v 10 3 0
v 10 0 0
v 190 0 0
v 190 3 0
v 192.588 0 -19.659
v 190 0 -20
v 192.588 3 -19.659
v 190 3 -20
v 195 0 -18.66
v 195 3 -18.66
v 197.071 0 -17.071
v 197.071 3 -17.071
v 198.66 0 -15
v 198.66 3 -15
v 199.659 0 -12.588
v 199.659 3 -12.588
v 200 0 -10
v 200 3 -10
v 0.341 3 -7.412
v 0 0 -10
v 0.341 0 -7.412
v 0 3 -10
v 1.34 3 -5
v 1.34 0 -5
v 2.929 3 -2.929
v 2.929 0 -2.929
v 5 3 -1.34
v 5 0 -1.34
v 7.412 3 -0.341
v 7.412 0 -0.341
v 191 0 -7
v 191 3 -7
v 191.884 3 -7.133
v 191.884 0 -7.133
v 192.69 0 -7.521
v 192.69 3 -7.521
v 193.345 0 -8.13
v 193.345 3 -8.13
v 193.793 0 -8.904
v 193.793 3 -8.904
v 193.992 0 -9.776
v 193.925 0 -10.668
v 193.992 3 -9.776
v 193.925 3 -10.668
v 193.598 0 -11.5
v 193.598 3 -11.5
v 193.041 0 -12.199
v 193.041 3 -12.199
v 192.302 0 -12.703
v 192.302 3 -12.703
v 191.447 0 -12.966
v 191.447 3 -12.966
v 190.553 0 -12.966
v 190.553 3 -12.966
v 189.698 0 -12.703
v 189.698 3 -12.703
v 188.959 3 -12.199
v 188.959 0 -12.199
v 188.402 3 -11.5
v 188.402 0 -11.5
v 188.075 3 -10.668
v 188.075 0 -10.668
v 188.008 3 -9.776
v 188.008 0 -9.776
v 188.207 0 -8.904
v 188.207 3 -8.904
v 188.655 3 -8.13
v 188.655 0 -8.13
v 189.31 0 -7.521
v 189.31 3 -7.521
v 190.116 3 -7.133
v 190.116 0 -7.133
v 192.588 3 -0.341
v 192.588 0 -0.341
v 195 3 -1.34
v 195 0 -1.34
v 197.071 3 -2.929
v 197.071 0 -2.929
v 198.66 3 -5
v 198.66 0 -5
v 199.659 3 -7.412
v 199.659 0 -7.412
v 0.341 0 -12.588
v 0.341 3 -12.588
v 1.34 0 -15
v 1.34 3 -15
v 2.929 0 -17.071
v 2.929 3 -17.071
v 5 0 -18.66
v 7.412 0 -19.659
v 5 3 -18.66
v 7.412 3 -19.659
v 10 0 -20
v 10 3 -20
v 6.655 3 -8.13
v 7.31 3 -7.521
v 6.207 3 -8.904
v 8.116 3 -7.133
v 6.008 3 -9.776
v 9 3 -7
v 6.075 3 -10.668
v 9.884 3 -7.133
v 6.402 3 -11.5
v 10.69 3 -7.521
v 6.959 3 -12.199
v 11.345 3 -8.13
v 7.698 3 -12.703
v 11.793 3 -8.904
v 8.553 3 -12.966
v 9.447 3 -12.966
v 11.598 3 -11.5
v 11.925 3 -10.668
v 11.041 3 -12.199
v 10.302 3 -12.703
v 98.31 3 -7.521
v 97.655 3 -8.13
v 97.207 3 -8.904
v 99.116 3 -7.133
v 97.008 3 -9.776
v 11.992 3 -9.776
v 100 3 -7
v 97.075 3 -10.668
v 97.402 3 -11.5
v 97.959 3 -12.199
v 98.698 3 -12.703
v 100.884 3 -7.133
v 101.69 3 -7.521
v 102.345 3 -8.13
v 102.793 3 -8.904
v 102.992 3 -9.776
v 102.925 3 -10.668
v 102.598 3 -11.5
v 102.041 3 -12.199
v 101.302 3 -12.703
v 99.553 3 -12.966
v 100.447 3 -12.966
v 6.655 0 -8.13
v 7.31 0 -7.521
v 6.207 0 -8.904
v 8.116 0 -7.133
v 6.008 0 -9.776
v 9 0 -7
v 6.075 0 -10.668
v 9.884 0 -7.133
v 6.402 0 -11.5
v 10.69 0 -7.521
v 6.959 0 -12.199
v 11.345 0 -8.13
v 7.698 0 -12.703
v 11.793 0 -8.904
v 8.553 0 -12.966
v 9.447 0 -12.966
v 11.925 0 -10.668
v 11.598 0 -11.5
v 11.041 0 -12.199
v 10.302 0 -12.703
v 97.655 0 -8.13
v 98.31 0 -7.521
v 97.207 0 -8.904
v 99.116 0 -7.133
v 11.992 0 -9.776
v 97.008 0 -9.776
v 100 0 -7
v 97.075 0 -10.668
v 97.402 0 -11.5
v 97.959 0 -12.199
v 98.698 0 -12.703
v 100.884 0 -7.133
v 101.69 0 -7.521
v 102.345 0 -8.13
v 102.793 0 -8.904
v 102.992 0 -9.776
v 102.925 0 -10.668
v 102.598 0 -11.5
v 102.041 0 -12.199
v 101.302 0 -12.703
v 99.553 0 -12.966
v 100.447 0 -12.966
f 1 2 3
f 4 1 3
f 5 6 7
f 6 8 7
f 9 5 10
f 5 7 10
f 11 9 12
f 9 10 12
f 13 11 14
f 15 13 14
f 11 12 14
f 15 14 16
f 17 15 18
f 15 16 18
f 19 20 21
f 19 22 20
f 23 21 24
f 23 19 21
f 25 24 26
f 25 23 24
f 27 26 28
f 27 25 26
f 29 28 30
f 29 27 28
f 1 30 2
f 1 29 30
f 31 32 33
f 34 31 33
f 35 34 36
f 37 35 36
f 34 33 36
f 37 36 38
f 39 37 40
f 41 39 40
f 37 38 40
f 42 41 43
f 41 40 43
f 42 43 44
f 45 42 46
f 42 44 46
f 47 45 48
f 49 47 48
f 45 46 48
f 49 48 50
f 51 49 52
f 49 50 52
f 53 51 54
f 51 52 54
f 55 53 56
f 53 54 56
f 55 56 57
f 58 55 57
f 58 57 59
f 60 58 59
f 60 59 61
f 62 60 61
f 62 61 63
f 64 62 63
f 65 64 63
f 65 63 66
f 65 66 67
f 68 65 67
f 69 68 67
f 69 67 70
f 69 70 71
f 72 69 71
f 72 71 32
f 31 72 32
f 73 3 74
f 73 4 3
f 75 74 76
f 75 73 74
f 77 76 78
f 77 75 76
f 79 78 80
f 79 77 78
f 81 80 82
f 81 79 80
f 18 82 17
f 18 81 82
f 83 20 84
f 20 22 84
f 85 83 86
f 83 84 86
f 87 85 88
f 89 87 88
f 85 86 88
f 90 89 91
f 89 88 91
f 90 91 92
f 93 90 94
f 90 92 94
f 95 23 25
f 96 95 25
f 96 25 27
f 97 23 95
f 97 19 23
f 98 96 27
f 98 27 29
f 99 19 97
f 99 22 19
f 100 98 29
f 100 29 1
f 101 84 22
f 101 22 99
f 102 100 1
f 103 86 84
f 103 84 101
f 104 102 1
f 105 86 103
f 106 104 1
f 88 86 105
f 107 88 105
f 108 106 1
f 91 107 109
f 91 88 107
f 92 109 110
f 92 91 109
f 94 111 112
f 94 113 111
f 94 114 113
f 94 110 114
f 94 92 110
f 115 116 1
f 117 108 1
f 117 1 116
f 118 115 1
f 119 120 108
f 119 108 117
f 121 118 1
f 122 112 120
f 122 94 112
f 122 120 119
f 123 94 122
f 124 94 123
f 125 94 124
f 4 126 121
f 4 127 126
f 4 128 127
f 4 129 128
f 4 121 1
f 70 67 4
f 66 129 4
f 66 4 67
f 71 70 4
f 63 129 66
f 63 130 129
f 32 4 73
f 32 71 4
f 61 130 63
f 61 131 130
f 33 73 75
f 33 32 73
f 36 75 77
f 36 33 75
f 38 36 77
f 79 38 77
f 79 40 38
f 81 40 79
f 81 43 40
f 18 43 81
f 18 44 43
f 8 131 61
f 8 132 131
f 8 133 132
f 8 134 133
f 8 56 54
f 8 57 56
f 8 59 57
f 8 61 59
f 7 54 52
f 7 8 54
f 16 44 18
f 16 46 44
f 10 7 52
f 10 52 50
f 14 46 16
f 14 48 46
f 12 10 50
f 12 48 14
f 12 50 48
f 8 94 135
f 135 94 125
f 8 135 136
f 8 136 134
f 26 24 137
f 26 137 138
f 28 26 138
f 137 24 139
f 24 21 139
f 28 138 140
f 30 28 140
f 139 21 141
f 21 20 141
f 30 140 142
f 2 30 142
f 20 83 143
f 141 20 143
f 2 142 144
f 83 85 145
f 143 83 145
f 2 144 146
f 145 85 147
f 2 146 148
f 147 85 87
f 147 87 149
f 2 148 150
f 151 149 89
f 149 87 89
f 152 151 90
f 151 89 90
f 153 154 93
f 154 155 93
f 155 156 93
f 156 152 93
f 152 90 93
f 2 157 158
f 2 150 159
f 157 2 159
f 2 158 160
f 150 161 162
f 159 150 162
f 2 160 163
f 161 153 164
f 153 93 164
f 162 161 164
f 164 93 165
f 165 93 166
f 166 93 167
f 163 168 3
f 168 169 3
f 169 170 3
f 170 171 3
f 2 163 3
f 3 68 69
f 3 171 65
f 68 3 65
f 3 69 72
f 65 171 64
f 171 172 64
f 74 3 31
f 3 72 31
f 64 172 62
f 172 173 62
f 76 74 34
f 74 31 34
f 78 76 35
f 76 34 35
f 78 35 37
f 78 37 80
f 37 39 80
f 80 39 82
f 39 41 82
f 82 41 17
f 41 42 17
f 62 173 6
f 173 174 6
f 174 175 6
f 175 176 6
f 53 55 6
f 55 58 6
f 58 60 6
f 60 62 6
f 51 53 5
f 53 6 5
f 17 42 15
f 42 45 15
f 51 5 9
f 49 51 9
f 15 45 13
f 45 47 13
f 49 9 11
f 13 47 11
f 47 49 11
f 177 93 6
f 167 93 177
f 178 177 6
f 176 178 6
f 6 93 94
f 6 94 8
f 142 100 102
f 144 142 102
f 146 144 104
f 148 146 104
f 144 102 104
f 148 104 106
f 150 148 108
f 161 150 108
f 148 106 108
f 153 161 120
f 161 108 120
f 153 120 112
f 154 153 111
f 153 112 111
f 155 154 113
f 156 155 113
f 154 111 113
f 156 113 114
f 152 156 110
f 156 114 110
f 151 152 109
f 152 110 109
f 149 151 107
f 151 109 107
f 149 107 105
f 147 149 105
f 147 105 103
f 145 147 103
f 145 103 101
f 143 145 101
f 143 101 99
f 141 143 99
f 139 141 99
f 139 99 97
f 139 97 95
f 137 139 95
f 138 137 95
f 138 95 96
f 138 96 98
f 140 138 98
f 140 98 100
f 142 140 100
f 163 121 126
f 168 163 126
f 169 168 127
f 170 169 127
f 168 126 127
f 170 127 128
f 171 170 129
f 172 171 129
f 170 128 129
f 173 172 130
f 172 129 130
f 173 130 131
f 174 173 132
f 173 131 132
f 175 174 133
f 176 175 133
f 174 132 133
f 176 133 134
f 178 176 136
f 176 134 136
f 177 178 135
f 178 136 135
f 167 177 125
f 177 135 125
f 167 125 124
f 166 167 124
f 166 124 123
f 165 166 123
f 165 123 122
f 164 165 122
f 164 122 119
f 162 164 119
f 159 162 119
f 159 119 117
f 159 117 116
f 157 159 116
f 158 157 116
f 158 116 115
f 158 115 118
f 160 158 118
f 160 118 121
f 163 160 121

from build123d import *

# Parameters (mm, degrees)
SKETCH2_W           = 200
SKETCH2_H           = 20
BOSS_EXTRUDE1_DEPTH = 3
SKETCH3_R           = 3
CUT_EXTRUDE1_DEPTH  = 202.019899512
SKETCH4_R           = 3
CUT_EXTRUDE2_DEPTH  = 202.019899512
FILLET1_R           = 10
FILLET2_R           = 10
SKETCH6_R           = 3
CUT_EXTRUDE3_DEPTH  = 202.019899512


with BuildPart() as part:
    # Sketch2 → Boss-Extrude1 (new body)
    with BuildSketch(Plane(origin=(0, 0, 0), x_dir=(1, 0, 0), z_dir=(0, 1, 0))):
        with Locations((100, 10)):
            Rectangle(SKETCH2_W, SKETCH2_H)
    extrude(amount=BOSS_EXTRUDE1_DEPTH)

    # Sketch3 → Cut-Extrude1 (cut, through all)
    with BuildSketch(Plane(origin=(0, 3, 0), x_dir=(1, 0, 0), z_dir=(0, 1, 0))):
        with Locations(Location((9, 10, 0), (0, 0, 270))):
            Circle(SKETCH3_R)
    extrude(amount=-CUT_EXTRUDE1_DEPTH, mode=Mode.SUBTRACT)

    # Sketch4 → Cut-Extrude2 (cut, through all)
    with BuildSketch(Plane(origin=(0, 3, 0), x_dir=(1, 0, 0), z_dir=(0, 1, 0))):
        with Locations(Location((191, 10, 0), (0, 0, 270))):
            Circle(SKETCH4_R)
    extrude(amount=-CUT_EXTRUDE2_DEPTH, mode=Mode.SUBTRACT)

    # Fillet1
    fillet1_edges = [part.edges().sort_by_distance(p)[0] for p in [
        (0, 1.5, -20),
        (0, 1.5, 0),
    ]]
    fillet(fillet1_edges, radius=FILLET1_R - 0.0001)  # a hair under: the kernel refuses the full size

    # Fillet2
    fillet2_edges = [part.edges().sort_by_distance(p)[0] for p in [
        (200, 1.5, -20),
        (200, 1.5, 0),
    ]]
    fillet(fillet2_edges, radius=FILLET2_R - 0.0001)  # a hair under: the kernel refuses the full size

    # Sketch6 → Cut-Extrude3 (cut, through all)
    with BuildSketch(Plane(origin=(0, 3, 0), x_dir=(1, 0, 0), z_dir=(0, 1, 0))):
        with Locations(Location((100, 10, 0), (0, 0, 270))):
            Circle(SKETCH6_R)
    extrude(amount=-CUT_EXTRUDE3_DEPTH, mode=Mode.SUBTRACT)


solid = part.part
